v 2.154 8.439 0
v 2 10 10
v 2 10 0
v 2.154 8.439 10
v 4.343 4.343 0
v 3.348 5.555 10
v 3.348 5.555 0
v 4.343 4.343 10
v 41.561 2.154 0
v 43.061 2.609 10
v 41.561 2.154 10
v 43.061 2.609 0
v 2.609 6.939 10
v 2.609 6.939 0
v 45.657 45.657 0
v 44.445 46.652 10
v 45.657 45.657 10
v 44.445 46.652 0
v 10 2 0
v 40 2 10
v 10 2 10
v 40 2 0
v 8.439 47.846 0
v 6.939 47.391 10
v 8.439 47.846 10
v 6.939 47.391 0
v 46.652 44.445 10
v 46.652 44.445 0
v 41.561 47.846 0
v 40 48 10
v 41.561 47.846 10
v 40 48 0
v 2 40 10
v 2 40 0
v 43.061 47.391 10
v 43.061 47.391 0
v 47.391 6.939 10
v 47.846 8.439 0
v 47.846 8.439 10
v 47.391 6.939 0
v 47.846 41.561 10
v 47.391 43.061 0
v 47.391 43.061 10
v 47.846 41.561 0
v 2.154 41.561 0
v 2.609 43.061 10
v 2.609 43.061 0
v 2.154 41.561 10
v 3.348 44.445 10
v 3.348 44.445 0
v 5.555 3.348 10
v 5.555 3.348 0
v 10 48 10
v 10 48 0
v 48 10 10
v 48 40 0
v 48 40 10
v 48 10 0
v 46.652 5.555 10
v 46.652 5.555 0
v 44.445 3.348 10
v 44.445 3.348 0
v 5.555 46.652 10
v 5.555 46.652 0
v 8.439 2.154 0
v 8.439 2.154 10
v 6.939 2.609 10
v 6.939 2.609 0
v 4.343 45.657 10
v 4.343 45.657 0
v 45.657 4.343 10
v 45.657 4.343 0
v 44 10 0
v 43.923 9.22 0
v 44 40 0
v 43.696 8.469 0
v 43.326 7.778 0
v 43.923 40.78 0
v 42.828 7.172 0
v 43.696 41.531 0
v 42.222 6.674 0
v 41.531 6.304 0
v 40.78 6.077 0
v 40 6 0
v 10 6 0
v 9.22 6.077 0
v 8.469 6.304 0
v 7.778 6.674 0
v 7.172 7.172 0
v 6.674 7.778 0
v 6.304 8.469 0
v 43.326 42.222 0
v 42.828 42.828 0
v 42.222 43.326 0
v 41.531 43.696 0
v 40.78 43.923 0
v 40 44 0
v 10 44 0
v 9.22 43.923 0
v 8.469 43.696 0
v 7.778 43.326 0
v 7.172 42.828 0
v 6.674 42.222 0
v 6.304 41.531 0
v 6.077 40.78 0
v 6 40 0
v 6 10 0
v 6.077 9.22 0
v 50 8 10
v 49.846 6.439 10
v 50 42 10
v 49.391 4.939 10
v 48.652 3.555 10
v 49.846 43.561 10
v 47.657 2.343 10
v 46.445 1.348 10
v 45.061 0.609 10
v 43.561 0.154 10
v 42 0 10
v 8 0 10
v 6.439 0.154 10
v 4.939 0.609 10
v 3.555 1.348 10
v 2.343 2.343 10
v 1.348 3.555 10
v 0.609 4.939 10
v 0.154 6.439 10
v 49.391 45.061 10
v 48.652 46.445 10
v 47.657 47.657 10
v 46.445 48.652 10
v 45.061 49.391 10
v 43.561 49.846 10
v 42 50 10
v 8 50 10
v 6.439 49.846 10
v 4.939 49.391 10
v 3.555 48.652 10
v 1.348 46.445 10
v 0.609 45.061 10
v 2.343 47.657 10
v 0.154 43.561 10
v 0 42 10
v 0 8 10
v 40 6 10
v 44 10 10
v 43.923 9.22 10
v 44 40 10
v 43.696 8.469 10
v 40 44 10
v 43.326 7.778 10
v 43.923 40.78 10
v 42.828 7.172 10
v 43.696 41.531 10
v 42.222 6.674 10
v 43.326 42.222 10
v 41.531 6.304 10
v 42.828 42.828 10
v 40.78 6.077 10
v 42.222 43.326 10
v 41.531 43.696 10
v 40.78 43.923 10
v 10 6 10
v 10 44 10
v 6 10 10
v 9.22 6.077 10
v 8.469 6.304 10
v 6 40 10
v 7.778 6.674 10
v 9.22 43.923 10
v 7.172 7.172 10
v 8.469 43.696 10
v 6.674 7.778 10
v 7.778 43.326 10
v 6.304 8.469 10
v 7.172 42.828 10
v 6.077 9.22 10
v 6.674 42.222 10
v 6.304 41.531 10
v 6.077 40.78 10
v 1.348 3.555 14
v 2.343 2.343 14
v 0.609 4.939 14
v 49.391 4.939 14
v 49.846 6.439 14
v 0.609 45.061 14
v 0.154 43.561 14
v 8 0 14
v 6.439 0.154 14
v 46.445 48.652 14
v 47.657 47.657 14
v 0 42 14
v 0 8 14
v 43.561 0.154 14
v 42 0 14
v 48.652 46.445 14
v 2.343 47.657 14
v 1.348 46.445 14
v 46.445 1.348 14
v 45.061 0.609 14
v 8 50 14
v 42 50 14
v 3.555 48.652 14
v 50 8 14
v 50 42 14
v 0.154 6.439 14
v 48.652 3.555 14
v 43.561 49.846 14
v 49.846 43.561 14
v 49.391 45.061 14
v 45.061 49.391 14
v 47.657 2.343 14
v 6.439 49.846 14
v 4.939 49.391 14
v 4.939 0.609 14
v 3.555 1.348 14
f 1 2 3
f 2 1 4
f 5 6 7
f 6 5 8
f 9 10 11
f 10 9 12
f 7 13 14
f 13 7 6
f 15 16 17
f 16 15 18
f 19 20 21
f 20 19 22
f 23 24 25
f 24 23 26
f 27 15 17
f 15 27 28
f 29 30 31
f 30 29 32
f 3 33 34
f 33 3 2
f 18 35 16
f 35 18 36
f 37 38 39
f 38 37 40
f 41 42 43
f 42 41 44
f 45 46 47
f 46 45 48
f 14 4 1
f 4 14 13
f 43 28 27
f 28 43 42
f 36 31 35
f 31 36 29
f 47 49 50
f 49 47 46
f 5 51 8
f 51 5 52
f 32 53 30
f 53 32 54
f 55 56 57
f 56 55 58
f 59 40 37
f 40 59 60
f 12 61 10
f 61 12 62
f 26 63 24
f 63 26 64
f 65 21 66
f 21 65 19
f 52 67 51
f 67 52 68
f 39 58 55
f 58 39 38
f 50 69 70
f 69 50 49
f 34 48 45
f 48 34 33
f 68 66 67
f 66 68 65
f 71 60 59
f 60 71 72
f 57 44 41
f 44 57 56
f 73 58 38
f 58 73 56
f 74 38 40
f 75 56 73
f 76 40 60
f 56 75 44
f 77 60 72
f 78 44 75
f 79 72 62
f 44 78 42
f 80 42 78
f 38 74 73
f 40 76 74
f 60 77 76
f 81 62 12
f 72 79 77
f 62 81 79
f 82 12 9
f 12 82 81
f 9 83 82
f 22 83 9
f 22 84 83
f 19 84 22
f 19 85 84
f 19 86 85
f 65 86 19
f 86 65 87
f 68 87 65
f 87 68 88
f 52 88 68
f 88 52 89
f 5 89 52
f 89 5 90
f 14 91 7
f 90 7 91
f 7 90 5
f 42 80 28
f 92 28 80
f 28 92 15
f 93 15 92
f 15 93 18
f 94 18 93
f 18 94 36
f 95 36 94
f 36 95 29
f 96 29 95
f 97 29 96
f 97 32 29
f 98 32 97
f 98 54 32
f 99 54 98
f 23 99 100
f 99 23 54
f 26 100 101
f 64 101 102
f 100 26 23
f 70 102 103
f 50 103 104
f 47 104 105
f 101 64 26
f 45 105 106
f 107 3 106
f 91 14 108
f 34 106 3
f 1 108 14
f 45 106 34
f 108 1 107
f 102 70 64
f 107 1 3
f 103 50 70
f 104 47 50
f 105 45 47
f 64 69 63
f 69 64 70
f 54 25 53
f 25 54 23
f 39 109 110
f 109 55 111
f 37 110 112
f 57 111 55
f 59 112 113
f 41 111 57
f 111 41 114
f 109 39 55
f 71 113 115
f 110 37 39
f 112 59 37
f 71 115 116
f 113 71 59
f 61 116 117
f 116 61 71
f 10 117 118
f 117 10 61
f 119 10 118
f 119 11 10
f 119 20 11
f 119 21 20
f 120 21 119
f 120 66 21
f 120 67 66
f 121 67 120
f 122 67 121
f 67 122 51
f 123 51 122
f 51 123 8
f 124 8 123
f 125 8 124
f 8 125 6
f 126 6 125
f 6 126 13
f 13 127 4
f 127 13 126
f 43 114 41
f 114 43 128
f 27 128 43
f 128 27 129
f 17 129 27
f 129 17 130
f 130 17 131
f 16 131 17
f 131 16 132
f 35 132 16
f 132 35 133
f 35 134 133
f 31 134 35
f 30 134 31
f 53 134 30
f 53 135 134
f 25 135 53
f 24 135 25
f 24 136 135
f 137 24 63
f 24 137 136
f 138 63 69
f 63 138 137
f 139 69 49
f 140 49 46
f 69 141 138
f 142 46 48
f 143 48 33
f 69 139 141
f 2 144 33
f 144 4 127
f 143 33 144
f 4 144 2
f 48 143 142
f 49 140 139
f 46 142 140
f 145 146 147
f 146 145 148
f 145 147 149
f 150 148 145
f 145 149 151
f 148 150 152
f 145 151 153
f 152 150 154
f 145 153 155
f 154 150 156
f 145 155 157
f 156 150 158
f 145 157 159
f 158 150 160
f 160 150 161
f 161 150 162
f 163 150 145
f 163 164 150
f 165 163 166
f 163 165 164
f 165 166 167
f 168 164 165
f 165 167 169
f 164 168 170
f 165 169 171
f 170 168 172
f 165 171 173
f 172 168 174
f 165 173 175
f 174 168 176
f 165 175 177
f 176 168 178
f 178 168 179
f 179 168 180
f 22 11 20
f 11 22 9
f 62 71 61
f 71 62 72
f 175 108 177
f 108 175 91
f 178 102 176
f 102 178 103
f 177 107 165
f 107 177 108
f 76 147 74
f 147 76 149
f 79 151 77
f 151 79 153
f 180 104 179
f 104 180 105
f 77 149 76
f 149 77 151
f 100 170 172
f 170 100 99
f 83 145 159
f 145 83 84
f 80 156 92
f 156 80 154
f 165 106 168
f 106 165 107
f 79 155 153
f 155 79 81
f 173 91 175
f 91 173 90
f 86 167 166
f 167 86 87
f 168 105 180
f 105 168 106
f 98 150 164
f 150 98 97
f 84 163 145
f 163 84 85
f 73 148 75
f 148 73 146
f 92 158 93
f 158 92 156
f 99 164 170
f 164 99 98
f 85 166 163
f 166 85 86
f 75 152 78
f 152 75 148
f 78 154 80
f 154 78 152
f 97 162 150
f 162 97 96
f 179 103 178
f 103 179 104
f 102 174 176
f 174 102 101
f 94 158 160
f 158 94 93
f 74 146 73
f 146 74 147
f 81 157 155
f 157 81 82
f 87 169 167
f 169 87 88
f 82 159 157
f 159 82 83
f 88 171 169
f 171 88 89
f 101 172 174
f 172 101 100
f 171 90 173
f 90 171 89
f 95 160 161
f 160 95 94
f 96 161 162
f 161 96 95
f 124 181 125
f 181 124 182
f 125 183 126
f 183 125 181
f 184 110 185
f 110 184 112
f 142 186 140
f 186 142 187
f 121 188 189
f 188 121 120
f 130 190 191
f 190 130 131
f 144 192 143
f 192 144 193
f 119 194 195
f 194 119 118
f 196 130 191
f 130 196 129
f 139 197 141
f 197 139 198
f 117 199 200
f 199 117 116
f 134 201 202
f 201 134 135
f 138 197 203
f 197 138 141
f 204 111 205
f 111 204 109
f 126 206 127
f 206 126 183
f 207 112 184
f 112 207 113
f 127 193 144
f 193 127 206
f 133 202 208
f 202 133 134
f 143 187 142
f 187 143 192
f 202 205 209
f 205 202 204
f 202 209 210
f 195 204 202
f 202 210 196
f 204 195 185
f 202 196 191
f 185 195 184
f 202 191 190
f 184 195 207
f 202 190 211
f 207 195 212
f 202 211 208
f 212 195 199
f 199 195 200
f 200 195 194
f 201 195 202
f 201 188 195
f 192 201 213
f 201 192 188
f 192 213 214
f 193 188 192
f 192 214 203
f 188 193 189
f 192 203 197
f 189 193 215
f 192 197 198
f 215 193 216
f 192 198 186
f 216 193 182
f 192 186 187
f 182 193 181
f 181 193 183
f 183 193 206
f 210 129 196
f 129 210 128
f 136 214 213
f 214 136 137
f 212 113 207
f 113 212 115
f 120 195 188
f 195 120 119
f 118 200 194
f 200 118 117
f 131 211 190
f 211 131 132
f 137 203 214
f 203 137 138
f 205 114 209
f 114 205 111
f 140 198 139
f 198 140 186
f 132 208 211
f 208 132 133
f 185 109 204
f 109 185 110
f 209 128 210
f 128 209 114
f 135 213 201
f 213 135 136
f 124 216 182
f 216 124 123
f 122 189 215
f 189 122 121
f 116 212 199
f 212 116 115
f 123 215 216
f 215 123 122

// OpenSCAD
// file: plates.scad
// Parametric footprint test box: closed top, open bottom, thick walls
wall   = 4;     // side wall thickness, mm (inner edge is 5 mm closer to center)
wall_margin = 2;   // margin from the outside edge, mm

corner_r = 8;   // outer corner rounding radius, mm (must be > wall for inside to round too)
trim_top = 0.4; // top crown trim for over-extrusion compensation, mm

$fn = 32;

// ---- Joint slot support ----
// Rectangular through-cuts in a wall so a snap-fit joint (see joint.scad)
// can be plugged into the plate. Slots are centered on the wall's height
// by default and placed on the straight (non-rounded) section of the wall.
joint_slot_w = 12;   // slot width along the wall run, mm
joint_slot_h = 6;     // slot height, mm

function plate_exports() = [joint_slot_w, joint_slot_h, wall, wall_margin];

// rounded rectangular prism, corners rounded on the xy plane only
module rounded_box(w, l, h, r, m = wall_margin) {
    linear_extrude(height = h)
        hull() {
            for (x = [r + m, w - r - m], y = [r + m, l - r - m])
                translate([x, y]) circle(r = r);
        }
}

// Build a list of [side, offset, z_offset] joint entries spaced along one wall.
// start is the first slot center offset from the wall edge; pitch is the spacing.
function make_side_joints(side, slot_count, pitch = 50, start = 25, z_offset = 0) = [

    for (i = [0 : slot_count - 1])
        [side, start + pitch * i, z_offset]
];

// side: "north" | "south" | "east" | "west" — which outer wall to cut through
// offset: distance of the slot center from the wall's left/bottom edge along the wall run
// z_offset: shift of the slot center along the wall height, from mid-height
module wall_slot_cut(w, l, h, side, w_slot = joint_slot_w, h_slot = joint_slot_h, offset = 0, z_offset = 0, m_margin = wall_margin) {
    
    cut_len = wall + m_margin;      // through-cut, plus 1mm margin each side
    z_slot  = h/2 + z_offset - h_slot/2;

    if (side == "east")
        translate([w - wall - m_margin -1 , offset - w_slot/2, z_slot])
            cube([cut_len, w_slot, h_slot]);
    else if (side == "west")
        translate([m_margin-1, offset - w_slot/2, z_slot])
            cube([cut_len, w_slot, h_slot]);
    else if (side == "north")
        translate([offset - w_slot/2, l - wall - m_margin -1, z_slot])
            cube([w_slot, cut_len, h_slot]);
    else if (side == "south")
        translate([offset - w_slot/2, +m_margin-1, z_slot])
            cube([w_slot, cut_len, h_slot]);
}

// Build the separate top plane. It sits on top of the wall section when split.
module plate_top(w, l, top_height = top_t) {
    rounded_box(w, l, top_height, corner_r,0 );
}

// Optional helper for prints that overfill the top edge by a small amount.
// The trim affects only the crown: the lower body keeps the full footprint,
// and the topmost layer is inset slightly around the edge.
module plate_top_trimmed(w, l, top_height = top_t, trim = top_trim) {
    crown_h = min(trim, top_height);
    body_h = max(top_height - crown_h, 0.01);
    inset_w = max(w - 2 * trim, 0.01);
    inset_l = max(l - 2 * trim, 0.01);
    inset_r = max(corner_r - trim, 0.01);

    union() {
        rounded_box(w, l, body_h, corner_r, 0);
        translate([trim, trim, body_h])
            rounded_box(inset_w, inset_l, crown_h, inset_r, 0);
    }
}

// Build the open-bottom wall section. The wall section ends at the underside
// of the separate top plane.
module plate_walls(w, l, wall_height, joints = [], slot_height = wall_height) {
    inner_r = max(corner_r - wall, 0.1);
    difference() {
        rounded_box(w, l, wall_height, corner_r);
        translate([wall, wall, -1])
            // Extend beyond the top so the wall section stays open.
            rounded_box(w - 2*wall, l - 2*wall, wall_height + 2, inner_r);
        for (j = joints)
                wall_slot_cut(w, l, slot_height, j[0], offset = j[1], z_offset = len(j) > 2 ? j[2] : 0);
            
    }
}

// joints: list of [side, offset, z_offset] triples adding a slot cutout each,
// e.g. [["east", 0, 0]]. Defaults to no slots (unchanged behavior).
// top_trim: optional crown trim in mm for over-extrusion compensation.
// we can do prints with or without top trim - if 0 no trim and justnice plate
module footprint_box(w, l, h, joints = [], top_trim = 0, top_height = 4) {
    wall_height = h ;
    plate_walls(w, l, wall_height, joints, slot_height = h);
    translate([0, 0, wall_height])
        if (top_trim > 0)
            plate_top_trimmed(w, l, top_height, top_trim);
        else
            plate_top(w, l, top_height);
}


// Build a printable footprint layout with joints on all four outer walls.
// tt- top trim for the footprint box, can be 0
module print_footprint(sizex = 50, sizey = 50, sizez = 10, top = 4, scount_x = 1, scount_y = 1, tt = 0.5) {
    slot_count_x = scount_x;
    slot_count_y = scount_y;
    slots = concat(
        make_side_joints("north", slot_count_x, sizex, sizex / 2),
        make_side_joints("south", slot_count_x, sizex, sizex/ 2),
        make_side_joints("east", slot_count_y, sizey , sizey / 2),
        make_side_joints("west", slot_count_y, sizey , sizey / 2)
    );

    footprint_box(sizex* slot_count_x, sizey* slot_count_y, sizez,
        joints = slots,
        top_trim = tt,
        top_height = top);
}
// main file
top_thickness = 4;
top_t = top_thickness;

include <plates.scad>;

// Select "preview" to see the two-color plate, or export "plate" and
// "inlay" separately to assign them different filament colors in a slicer.
part = "preview";

plate_width = 50;
plate_length = 50;
wall_height = 10;

inlay_depth = 0.6;
line_width = 0.8;
plate_color = [0.82, 0.82, 0.78];
inlay_color = [0.9, 0.18, 0.08];

// One closed, continuous mushroom-cloud outline, centered on the plate.
bomb_outline = [
    [0, 13], [-3, 12], [-5, 10], [-6, 7], [-9, 7],
    [-11, 8], [-14, 8], [-16, 6], [-15.5, 4], [-13, 3],
    [-10, 3], [-9, 1], [-7, -1], [-6, -3], [-6, -8],
    [-9, -9], [-11, -10], [-10, -11], [-6, -10], [-3, -11],
    [0, -10], [3, -11], [6, -10], [10, -11], [11, -10],
    [9, -9], [6, -8], [6, -3], [7, -1], [9, 1],
    [10, 3], [13, 3], [15.5, 4], [16, 6], [14, 8],
    [11, 8], [9, 7], [6, 7], [5, 10], [3, 12], [0, 13]
];

icon_scale = min(plate_width, plate_length) / 50;
surface_z = wall_height + top_thickness;

module bomb_line_2d() {
    translate([plate_width / 2, plate_length / 2])
        scale([icon_scale, icon_scale])
            for (i = [0 : len(bomb_outline) - 2])
                hull() {
                    translate(bomb_outline[i])
                        circle(d = line_width, $fn = 16);
                    translate(bomb_outline[i + 1])
                        circle(d = line_width, $fn = 16);
                }
}

module line_cavity() {
    translate([0, 0, surface_z - inlay_depth])
        linear_extrude(height = inlay_depth + 0.01)
            bomb_line_2d();
}

module plate_with_cavity() {
    difference() {
        footprint_box(
            plate_width,
            plate_length,
            wall_height,
            top_height = top_thickness
        );
        line_cavity();
    }
}

module bomb_line_inlay() {
    translate([0, 0, surface_z - inlay_depth])
        linear_extrude(height = inlay_depth)
            bomb_line_2d();
}

if (part == "plate") {
    plate_with_cavity();
} else if (part == "inlay") {
    bomb_line_inlay();
} else if (part == "preview") {
    color(plate_color) plate_with_cavity();
    color(inlay_color) bomb_line_inlay();
} else {
    assert(false, "part must be \"preview\", \"plate\", or \"inlay\"");
}
